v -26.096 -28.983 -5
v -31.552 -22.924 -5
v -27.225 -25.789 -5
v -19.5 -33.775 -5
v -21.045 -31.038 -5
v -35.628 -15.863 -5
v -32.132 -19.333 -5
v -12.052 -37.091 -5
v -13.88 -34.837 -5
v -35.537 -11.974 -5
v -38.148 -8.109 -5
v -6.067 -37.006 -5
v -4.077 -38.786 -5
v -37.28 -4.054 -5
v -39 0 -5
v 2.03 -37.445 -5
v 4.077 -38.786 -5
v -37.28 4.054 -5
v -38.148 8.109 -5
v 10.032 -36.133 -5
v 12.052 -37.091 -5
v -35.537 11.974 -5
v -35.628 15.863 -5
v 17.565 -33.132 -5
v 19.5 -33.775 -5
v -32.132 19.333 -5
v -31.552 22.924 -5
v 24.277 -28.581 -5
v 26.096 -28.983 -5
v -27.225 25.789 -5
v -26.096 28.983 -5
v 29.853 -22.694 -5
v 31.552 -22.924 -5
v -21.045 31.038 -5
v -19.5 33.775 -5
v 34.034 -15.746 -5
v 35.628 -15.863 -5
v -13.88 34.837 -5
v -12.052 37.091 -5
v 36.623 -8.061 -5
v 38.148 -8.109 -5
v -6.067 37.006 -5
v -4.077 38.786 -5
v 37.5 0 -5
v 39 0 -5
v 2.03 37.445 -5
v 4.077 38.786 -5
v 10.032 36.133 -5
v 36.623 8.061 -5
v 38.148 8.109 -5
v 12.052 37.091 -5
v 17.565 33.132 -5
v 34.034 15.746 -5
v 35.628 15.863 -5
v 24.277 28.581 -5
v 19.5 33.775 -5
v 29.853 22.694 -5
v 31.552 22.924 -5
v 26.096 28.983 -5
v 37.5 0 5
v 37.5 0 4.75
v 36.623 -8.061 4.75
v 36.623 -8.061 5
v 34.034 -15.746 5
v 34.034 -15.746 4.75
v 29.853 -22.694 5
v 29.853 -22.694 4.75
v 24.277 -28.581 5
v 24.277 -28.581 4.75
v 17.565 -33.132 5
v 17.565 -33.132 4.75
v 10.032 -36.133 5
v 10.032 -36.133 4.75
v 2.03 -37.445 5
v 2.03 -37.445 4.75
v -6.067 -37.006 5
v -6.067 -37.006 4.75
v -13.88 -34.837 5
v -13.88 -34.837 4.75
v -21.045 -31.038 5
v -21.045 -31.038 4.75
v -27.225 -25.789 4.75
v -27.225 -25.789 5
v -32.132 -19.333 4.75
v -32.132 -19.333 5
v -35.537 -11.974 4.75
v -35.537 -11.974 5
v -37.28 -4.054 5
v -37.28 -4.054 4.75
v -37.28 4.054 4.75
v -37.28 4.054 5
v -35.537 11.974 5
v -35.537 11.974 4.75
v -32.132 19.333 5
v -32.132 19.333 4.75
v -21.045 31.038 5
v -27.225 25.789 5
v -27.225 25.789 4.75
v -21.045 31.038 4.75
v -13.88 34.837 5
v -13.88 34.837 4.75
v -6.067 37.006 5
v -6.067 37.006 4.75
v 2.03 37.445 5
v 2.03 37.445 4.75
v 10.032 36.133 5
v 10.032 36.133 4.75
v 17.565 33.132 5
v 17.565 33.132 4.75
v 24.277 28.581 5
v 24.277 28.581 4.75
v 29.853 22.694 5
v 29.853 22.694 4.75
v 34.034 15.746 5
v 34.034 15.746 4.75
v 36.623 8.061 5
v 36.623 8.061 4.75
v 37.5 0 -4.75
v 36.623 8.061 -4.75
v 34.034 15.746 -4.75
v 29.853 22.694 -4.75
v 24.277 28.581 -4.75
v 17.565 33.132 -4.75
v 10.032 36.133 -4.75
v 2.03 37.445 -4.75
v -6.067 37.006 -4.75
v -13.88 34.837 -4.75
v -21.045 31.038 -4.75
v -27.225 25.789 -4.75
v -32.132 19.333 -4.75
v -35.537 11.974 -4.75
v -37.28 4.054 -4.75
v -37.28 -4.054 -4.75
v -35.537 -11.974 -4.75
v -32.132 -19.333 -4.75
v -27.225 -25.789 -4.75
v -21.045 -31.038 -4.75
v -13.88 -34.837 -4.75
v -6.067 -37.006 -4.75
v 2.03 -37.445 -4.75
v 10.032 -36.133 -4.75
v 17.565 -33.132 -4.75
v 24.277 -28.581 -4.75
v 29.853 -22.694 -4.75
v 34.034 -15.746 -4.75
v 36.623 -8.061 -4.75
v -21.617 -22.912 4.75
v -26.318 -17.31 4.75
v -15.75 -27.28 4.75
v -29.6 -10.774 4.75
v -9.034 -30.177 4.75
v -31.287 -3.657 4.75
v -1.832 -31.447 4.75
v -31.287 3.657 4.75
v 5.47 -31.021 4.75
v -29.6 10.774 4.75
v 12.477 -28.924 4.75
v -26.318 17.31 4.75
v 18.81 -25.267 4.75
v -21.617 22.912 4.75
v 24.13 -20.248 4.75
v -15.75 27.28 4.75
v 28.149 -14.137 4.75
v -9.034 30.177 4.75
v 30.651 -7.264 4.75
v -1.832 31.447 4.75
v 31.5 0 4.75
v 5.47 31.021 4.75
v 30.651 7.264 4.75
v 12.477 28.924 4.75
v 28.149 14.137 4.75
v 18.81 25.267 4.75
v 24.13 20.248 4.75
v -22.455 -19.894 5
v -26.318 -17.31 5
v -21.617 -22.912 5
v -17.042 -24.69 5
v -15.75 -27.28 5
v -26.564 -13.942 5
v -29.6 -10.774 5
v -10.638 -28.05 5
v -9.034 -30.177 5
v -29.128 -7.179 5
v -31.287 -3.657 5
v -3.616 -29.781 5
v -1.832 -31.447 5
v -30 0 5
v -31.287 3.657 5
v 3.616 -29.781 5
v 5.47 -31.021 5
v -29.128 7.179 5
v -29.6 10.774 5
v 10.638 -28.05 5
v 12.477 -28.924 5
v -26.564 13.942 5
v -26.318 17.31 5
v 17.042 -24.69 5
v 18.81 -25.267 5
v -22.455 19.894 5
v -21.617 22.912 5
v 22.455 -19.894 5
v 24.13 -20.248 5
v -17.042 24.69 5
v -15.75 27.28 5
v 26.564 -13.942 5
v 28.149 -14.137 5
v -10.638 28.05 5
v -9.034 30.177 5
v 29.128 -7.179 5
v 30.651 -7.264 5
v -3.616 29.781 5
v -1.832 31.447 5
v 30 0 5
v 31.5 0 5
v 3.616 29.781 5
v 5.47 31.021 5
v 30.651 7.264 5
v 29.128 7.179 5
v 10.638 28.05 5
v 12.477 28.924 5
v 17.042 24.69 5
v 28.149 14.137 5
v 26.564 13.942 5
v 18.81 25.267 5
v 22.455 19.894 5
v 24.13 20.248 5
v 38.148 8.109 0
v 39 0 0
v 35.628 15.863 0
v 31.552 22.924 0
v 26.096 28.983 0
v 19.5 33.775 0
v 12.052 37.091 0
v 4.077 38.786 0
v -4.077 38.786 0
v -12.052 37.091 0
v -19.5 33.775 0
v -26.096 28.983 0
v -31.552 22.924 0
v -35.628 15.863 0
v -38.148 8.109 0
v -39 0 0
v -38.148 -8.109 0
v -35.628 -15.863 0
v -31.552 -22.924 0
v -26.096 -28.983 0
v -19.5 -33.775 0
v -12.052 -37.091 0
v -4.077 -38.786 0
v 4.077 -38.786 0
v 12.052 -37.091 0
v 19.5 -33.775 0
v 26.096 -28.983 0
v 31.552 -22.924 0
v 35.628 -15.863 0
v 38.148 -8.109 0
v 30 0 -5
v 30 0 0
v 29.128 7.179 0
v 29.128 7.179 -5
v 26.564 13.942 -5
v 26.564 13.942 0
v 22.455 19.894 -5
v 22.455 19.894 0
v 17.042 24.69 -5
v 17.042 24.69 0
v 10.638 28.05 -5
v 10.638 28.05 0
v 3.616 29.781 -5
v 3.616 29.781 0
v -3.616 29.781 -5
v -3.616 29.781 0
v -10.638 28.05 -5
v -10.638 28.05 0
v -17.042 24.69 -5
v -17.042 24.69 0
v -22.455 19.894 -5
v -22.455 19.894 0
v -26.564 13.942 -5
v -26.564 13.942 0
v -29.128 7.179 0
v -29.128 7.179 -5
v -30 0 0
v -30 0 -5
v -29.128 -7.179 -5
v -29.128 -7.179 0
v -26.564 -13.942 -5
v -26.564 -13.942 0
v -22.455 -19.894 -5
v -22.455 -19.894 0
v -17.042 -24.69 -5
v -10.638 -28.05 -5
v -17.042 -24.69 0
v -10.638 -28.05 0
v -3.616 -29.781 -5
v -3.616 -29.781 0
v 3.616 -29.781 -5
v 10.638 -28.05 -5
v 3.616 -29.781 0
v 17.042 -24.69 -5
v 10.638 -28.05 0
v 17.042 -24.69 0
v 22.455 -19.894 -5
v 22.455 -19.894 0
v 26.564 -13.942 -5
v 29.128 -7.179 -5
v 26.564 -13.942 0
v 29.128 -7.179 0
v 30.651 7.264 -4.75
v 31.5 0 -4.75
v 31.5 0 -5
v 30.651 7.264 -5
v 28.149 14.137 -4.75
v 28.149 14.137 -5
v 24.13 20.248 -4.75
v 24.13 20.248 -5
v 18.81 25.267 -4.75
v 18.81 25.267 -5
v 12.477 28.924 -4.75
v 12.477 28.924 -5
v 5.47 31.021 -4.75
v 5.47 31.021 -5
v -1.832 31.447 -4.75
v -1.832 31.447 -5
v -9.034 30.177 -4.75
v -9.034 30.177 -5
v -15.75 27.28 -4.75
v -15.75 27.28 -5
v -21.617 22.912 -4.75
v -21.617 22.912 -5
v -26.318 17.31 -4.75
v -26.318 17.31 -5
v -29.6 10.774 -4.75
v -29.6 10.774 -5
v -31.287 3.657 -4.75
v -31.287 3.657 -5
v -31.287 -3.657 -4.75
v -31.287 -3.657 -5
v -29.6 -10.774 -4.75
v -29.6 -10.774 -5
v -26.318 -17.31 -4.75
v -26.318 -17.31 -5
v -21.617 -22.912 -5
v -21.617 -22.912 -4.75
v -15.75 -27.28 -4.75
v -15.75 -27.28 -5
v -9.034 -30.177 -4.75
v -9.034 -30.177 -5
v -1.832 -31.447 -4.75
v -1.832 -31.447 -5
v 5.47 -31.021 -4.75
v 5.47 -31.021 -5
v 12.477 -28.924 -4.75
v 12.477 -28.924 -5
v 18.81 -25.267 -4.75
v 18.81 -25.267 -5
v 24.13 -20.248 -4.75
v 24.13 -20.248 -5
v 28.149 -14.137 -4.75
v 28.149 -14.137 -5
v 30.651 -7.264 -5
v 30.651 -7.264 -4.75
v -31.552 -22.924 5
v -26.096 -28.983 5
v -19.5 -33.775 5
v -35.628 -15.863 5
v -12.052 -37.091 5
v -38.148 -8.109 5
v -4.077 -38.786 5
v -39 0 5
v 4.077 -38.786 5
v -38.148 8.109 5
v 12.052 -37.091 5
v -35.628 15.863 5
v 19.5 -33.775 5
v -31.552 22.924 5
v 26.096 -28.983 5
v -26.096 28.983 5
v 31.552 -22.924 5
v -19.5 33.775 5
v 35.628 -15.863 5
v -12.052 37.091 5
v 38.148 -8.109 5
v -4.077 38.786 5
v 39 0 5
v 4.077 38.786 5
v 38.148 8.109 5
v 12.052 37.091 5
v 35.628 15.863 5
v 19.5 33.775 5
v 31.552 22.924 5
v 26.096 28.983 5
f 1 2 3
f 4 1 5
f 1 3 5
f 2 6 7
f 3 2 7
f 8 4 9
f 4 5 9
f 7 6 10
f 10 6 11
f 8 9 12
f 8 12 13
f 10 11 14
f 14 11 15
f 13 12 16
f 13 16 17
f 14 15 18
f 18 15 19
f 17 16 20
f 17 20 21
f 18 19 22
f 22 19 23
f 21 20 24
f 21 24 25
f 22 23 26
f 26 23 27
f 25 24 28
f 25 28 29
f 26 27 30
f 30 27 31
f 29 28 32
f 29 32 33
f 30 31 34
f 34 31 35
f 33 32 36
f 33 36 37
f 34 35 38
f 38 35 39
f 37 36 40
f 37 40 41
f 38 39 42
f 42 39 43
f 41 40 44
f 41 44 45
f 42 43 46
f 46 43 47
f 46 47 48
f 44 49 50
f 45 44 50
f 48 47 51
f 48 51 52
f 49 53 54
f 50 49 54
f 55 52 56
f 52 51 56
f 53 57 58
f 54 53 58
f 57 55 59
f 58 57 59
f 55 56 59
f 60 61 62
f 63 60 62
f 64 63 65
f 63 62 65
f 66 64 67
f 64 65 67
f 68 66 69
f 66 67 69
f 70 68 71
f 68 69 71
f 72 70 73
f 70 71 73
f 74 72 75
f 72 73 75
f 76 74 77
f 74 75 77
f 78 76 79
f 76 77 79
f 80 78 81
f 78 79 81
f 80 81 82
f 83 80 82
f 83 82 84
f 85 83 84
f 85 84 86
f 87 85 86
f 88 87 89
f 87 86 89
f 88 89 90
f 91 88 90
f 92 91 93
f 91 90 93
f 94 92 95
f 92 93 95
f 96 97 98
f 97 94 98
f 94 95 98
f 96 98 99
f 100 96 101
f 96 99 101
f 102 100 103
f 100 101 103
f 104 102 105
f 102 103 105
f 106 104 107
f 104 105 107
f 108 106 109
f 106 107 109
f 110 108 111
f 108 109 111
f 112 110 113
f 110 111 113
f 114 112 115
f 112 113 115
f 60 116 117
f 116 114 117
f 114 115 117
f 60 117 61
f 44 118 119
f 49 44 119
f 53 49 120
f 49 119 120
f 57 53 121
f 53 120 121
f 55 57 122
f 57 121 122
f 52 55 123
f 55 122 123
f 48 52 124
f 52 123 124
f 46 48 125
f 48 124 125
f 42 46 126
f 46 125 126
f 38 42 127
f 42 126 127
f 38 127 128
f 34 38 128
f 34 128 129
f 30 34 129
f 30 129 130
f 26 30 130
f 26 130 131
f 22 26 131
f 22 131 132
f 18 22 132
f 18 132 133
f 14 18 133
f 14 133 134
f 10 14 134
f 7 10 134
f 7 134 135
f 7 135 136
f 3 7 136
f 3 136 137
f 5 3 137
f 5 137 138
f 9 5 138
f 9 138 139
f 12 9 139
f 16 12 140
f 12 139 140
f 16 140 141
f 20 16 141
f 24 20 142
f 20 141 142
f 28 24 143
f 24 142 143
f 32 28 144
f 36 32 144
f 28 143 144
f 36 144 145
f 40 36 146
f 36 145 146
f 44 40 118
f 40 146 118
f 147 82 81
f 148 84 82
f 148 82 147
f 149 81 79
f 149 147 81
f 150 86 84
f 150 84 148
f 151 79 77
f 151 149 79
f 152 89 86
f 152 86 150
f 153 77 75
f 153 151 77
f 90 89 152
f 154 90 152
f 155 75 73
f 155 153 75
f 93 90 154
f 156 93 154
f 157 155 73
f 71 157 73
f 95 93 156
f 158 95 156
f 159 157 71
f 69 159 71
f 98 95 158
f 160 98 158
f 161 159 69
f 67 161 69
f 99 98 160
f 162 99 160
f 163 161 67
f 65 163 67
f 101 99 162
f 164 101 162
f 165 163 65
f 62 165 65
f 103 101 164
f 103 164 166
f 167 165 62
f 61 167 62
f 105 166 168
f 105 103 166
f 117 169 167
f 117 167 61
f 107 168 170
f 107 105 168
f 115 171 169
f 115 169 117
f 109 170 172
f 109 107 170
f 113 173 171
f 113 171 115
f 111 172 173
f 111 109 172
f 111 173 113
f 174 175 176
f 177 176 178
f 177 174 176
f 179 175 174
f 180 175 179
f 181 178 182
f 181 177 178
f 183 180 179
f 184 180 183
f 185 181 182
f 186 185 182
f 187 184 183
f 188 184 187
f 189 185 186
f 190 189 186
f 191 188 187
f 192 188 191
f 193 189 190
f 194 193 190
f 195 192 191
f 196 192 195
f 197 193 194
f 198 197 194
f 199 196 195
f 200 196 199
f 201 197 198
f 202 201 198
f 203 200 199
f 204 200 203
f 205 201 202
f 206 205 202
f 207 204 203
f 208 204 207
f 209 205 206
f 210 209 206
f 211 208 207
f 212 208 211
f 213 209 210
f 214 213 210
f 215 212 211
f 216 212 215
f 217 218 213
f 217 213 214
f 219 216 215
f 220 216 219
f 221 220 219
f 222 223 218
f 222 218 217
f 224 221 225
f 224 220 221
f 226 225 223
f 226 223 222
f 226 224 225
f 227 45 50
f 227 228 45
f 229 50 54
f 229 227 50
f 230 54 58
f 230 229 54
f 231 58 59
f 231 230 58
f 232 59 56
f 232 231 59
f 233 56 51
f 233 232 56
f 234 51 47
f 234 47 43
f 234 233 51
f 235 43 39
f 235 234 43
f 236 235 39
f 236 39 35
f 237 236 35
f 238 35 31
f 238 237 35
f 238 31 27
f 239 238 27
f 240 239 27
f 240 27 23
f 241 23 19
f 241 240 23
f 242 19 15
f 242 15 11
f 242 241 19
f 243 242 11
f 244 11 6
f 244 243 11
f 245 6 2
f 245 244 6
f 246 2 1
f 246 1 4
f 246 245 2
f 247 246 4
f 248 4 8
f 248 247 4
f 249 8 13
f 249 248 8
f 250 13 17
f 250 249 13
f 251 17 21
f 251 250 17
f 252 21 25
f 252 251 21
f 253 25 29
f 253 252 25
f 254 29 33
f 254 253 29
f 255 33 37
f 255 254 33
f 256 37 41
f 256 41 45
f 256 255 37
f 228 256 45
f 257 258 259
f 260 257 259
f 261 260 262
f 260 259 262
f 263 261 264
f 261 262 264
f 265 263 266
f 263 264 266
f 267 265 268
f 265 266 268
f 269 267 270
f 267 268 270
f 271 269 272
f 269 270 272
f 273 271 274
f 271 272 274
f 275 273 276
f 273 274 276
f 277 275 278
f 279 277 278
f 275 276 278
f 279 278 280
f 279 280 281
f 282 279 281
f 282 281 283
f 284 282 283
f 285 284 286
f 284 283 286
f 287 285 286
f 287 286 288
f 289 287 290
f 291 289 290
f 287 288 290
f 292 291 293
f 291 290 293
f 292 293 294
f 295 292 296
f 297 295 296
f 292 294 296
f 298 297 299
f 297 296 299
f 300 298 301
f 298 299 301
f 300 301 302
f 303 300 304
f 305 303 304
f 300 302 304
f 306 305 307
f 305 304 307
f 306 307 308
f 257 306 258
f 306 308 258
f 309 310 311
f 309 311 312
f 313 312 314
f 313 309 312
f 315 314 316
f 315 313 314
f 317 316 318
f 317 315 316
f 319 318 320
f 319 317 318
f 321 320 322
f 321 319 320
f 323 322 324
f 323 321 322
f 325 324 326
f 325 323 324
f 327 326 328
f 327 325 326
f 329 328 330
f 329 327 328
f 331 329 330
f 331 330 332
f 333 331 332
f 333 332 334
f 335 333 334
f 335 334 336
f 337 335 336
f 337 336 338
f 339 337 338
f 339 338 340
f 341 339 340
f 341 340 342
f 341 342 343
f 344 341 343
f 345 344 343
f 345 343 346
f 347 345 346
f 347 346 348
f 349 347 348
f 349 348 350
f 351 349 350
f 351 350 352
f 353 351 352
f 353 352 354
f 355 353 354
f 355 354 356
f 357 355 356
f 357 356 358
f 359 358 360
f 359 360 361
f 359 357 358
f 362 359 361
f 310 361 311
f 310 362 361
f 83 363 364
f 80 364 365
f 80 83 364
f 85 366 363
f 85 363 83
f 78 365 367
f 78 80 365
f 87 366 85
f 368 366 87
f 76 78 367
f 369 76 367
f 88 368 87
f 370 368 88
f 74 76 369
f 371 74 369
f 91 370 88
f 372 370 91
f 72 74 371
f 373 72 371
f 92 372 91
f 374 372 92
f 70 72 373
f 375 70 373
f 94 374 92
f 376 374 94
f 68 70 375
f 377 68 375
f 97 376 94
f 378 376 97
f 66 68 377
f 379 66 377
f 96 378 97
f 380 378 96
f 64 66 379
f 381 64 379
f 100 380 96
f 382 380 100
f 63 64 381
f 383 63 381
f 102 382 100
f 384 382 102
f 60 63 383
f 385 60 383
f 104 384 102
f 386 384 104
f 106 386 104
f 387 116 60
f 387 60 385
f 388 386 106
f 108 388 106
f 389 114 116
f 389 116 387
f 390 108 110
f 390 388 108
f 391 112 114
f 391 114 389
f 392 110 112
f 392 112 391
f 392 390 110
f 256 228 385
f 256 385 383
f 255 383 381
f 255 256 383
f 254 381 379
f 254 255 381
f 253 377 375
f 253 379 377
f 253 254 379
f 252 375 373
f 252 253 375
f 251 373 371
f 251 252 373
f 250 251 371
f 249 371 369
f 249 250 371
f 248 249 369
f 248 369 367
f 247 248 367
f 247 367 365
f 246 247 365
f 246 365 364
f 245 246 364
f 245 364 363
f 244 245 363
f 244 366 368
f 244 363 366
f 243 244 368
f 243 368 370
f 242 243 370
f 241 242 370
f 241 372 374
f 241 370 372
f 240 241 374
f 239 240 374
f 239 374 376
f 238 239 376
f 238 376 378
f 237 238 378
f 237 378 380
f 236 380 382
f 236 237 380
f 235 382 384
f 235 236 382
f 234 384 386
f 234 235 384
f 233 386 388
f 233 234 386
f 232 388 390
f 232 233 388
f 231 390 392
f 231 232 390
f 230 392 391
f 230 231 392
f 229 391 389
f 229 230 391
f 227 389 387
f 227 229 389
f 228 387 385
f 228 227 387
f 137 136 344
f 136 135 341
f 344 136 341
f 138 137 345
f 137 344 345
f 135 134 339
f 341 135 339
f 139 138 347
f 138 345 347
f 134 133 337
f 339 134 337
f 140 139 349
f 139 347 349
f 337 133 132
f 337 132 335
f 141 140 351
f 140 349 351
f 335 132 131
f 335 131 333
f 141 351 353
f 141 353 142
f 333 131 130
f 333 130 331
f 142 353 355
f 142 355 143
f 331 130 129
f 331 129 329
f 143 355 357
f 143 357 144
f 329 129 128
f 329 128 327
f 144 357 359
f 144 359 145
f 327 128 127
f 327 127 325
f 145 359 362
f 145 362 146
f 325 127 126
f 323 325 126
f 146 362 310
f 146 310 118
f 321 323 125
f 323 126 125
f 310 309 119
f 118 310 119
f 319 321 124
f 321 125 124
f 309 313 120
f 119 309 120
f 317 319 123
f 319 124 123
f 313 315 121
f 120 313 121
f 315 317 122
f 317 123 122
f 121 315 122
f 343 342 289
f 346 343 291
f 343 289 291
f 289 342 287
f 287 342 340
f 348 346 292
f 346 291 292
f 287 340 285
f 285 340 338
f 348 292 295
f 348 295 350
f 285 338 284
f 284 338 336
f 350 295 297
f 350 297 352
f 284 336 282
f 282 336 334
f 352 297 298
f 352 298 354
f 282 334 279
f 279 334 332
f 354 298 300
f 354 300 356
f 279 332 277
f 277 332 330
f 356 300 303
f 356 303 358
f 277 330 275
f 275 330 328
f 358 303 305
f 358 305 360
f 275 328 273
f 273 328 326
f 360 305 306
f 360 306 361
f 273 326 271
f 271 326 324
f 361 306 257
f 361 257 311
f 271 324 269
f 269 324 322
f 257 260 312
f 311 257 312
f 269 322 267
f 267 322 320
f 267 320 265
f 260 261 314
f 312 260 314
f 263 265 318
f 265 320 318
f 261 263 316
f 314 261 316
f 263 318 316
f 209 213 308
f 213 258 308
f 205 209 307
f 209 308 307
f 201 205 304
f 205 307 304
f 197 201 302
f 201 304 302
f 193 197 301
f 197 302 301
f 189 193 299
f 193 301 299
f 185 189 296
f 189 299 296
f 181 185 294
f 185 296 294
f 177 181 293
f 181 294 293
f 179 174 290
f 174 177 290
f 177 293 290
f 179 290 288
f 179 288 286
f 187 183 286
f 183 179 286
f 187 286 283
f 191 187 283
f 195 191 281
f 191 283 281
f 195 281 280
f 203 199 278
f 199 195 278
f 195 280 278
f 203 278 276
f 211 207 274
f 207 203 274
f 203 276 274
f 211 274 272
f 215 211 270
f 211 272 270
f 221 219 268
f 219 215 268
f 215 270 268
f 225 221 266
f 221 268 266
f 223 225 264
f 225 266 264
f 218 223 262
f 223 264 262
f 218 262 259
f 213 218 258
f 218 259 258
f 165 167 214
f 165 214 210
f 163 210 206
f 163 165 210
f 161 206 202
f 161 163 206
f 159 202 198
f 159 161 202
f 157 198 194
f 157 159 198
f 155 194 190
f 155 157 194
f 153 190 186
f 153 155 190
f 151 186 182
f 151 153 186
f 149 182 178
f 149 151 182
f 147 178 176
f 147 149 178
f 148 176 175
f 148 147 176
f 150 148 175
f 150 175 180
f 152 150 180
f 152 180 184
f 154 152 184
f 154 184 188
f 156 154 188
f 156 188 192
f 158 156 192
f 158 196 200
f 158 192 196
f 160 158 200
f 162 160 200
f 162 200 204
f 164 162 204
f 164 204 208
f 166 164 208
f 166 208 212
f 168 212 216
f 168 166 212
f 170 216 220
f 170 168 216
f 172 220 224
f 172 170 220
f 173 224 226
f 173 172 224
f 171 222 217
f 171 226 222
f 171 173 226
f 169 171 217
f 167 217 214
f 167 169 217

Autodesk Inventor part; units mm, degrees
ref_plane "YZ Plane" through (0, 0, 0) normal (1, 0, 0) x (0, 1, 0)
ref_plane "XZ Plane" through (0, 0, 0) normal (0, 1, 0) x (-1, 0, 0)
ref_plane "XY Plane" through (0, 0, 0) normal (0, 0, 1) x (1, 0, 0)
sketch "Sketch1" plane through (0, 0, 0) normal (0, 0, 1) x (1, 0, 0)
  circle A0 centre (0, 0) radius 30
  circle A1 centre (0, 0) radius 39
  circle A2 centre (0, 0) radius 37.5
  circle A3 centre (0, 0) radius 31.5
  dimension "d0" = 60
  dimension "d1" = 78
  dimension "d2" = 1.5
  dimension "d3" = 1.5
extrude "Extrusion1" add sketch "Sketch1" along normal mid plane 10
extrude "Extrusion2" add sketch "Sketch1" along normal mid plane 9.5 contours A2
properties part number "6812ZZ" material "Steel, Carbon"
